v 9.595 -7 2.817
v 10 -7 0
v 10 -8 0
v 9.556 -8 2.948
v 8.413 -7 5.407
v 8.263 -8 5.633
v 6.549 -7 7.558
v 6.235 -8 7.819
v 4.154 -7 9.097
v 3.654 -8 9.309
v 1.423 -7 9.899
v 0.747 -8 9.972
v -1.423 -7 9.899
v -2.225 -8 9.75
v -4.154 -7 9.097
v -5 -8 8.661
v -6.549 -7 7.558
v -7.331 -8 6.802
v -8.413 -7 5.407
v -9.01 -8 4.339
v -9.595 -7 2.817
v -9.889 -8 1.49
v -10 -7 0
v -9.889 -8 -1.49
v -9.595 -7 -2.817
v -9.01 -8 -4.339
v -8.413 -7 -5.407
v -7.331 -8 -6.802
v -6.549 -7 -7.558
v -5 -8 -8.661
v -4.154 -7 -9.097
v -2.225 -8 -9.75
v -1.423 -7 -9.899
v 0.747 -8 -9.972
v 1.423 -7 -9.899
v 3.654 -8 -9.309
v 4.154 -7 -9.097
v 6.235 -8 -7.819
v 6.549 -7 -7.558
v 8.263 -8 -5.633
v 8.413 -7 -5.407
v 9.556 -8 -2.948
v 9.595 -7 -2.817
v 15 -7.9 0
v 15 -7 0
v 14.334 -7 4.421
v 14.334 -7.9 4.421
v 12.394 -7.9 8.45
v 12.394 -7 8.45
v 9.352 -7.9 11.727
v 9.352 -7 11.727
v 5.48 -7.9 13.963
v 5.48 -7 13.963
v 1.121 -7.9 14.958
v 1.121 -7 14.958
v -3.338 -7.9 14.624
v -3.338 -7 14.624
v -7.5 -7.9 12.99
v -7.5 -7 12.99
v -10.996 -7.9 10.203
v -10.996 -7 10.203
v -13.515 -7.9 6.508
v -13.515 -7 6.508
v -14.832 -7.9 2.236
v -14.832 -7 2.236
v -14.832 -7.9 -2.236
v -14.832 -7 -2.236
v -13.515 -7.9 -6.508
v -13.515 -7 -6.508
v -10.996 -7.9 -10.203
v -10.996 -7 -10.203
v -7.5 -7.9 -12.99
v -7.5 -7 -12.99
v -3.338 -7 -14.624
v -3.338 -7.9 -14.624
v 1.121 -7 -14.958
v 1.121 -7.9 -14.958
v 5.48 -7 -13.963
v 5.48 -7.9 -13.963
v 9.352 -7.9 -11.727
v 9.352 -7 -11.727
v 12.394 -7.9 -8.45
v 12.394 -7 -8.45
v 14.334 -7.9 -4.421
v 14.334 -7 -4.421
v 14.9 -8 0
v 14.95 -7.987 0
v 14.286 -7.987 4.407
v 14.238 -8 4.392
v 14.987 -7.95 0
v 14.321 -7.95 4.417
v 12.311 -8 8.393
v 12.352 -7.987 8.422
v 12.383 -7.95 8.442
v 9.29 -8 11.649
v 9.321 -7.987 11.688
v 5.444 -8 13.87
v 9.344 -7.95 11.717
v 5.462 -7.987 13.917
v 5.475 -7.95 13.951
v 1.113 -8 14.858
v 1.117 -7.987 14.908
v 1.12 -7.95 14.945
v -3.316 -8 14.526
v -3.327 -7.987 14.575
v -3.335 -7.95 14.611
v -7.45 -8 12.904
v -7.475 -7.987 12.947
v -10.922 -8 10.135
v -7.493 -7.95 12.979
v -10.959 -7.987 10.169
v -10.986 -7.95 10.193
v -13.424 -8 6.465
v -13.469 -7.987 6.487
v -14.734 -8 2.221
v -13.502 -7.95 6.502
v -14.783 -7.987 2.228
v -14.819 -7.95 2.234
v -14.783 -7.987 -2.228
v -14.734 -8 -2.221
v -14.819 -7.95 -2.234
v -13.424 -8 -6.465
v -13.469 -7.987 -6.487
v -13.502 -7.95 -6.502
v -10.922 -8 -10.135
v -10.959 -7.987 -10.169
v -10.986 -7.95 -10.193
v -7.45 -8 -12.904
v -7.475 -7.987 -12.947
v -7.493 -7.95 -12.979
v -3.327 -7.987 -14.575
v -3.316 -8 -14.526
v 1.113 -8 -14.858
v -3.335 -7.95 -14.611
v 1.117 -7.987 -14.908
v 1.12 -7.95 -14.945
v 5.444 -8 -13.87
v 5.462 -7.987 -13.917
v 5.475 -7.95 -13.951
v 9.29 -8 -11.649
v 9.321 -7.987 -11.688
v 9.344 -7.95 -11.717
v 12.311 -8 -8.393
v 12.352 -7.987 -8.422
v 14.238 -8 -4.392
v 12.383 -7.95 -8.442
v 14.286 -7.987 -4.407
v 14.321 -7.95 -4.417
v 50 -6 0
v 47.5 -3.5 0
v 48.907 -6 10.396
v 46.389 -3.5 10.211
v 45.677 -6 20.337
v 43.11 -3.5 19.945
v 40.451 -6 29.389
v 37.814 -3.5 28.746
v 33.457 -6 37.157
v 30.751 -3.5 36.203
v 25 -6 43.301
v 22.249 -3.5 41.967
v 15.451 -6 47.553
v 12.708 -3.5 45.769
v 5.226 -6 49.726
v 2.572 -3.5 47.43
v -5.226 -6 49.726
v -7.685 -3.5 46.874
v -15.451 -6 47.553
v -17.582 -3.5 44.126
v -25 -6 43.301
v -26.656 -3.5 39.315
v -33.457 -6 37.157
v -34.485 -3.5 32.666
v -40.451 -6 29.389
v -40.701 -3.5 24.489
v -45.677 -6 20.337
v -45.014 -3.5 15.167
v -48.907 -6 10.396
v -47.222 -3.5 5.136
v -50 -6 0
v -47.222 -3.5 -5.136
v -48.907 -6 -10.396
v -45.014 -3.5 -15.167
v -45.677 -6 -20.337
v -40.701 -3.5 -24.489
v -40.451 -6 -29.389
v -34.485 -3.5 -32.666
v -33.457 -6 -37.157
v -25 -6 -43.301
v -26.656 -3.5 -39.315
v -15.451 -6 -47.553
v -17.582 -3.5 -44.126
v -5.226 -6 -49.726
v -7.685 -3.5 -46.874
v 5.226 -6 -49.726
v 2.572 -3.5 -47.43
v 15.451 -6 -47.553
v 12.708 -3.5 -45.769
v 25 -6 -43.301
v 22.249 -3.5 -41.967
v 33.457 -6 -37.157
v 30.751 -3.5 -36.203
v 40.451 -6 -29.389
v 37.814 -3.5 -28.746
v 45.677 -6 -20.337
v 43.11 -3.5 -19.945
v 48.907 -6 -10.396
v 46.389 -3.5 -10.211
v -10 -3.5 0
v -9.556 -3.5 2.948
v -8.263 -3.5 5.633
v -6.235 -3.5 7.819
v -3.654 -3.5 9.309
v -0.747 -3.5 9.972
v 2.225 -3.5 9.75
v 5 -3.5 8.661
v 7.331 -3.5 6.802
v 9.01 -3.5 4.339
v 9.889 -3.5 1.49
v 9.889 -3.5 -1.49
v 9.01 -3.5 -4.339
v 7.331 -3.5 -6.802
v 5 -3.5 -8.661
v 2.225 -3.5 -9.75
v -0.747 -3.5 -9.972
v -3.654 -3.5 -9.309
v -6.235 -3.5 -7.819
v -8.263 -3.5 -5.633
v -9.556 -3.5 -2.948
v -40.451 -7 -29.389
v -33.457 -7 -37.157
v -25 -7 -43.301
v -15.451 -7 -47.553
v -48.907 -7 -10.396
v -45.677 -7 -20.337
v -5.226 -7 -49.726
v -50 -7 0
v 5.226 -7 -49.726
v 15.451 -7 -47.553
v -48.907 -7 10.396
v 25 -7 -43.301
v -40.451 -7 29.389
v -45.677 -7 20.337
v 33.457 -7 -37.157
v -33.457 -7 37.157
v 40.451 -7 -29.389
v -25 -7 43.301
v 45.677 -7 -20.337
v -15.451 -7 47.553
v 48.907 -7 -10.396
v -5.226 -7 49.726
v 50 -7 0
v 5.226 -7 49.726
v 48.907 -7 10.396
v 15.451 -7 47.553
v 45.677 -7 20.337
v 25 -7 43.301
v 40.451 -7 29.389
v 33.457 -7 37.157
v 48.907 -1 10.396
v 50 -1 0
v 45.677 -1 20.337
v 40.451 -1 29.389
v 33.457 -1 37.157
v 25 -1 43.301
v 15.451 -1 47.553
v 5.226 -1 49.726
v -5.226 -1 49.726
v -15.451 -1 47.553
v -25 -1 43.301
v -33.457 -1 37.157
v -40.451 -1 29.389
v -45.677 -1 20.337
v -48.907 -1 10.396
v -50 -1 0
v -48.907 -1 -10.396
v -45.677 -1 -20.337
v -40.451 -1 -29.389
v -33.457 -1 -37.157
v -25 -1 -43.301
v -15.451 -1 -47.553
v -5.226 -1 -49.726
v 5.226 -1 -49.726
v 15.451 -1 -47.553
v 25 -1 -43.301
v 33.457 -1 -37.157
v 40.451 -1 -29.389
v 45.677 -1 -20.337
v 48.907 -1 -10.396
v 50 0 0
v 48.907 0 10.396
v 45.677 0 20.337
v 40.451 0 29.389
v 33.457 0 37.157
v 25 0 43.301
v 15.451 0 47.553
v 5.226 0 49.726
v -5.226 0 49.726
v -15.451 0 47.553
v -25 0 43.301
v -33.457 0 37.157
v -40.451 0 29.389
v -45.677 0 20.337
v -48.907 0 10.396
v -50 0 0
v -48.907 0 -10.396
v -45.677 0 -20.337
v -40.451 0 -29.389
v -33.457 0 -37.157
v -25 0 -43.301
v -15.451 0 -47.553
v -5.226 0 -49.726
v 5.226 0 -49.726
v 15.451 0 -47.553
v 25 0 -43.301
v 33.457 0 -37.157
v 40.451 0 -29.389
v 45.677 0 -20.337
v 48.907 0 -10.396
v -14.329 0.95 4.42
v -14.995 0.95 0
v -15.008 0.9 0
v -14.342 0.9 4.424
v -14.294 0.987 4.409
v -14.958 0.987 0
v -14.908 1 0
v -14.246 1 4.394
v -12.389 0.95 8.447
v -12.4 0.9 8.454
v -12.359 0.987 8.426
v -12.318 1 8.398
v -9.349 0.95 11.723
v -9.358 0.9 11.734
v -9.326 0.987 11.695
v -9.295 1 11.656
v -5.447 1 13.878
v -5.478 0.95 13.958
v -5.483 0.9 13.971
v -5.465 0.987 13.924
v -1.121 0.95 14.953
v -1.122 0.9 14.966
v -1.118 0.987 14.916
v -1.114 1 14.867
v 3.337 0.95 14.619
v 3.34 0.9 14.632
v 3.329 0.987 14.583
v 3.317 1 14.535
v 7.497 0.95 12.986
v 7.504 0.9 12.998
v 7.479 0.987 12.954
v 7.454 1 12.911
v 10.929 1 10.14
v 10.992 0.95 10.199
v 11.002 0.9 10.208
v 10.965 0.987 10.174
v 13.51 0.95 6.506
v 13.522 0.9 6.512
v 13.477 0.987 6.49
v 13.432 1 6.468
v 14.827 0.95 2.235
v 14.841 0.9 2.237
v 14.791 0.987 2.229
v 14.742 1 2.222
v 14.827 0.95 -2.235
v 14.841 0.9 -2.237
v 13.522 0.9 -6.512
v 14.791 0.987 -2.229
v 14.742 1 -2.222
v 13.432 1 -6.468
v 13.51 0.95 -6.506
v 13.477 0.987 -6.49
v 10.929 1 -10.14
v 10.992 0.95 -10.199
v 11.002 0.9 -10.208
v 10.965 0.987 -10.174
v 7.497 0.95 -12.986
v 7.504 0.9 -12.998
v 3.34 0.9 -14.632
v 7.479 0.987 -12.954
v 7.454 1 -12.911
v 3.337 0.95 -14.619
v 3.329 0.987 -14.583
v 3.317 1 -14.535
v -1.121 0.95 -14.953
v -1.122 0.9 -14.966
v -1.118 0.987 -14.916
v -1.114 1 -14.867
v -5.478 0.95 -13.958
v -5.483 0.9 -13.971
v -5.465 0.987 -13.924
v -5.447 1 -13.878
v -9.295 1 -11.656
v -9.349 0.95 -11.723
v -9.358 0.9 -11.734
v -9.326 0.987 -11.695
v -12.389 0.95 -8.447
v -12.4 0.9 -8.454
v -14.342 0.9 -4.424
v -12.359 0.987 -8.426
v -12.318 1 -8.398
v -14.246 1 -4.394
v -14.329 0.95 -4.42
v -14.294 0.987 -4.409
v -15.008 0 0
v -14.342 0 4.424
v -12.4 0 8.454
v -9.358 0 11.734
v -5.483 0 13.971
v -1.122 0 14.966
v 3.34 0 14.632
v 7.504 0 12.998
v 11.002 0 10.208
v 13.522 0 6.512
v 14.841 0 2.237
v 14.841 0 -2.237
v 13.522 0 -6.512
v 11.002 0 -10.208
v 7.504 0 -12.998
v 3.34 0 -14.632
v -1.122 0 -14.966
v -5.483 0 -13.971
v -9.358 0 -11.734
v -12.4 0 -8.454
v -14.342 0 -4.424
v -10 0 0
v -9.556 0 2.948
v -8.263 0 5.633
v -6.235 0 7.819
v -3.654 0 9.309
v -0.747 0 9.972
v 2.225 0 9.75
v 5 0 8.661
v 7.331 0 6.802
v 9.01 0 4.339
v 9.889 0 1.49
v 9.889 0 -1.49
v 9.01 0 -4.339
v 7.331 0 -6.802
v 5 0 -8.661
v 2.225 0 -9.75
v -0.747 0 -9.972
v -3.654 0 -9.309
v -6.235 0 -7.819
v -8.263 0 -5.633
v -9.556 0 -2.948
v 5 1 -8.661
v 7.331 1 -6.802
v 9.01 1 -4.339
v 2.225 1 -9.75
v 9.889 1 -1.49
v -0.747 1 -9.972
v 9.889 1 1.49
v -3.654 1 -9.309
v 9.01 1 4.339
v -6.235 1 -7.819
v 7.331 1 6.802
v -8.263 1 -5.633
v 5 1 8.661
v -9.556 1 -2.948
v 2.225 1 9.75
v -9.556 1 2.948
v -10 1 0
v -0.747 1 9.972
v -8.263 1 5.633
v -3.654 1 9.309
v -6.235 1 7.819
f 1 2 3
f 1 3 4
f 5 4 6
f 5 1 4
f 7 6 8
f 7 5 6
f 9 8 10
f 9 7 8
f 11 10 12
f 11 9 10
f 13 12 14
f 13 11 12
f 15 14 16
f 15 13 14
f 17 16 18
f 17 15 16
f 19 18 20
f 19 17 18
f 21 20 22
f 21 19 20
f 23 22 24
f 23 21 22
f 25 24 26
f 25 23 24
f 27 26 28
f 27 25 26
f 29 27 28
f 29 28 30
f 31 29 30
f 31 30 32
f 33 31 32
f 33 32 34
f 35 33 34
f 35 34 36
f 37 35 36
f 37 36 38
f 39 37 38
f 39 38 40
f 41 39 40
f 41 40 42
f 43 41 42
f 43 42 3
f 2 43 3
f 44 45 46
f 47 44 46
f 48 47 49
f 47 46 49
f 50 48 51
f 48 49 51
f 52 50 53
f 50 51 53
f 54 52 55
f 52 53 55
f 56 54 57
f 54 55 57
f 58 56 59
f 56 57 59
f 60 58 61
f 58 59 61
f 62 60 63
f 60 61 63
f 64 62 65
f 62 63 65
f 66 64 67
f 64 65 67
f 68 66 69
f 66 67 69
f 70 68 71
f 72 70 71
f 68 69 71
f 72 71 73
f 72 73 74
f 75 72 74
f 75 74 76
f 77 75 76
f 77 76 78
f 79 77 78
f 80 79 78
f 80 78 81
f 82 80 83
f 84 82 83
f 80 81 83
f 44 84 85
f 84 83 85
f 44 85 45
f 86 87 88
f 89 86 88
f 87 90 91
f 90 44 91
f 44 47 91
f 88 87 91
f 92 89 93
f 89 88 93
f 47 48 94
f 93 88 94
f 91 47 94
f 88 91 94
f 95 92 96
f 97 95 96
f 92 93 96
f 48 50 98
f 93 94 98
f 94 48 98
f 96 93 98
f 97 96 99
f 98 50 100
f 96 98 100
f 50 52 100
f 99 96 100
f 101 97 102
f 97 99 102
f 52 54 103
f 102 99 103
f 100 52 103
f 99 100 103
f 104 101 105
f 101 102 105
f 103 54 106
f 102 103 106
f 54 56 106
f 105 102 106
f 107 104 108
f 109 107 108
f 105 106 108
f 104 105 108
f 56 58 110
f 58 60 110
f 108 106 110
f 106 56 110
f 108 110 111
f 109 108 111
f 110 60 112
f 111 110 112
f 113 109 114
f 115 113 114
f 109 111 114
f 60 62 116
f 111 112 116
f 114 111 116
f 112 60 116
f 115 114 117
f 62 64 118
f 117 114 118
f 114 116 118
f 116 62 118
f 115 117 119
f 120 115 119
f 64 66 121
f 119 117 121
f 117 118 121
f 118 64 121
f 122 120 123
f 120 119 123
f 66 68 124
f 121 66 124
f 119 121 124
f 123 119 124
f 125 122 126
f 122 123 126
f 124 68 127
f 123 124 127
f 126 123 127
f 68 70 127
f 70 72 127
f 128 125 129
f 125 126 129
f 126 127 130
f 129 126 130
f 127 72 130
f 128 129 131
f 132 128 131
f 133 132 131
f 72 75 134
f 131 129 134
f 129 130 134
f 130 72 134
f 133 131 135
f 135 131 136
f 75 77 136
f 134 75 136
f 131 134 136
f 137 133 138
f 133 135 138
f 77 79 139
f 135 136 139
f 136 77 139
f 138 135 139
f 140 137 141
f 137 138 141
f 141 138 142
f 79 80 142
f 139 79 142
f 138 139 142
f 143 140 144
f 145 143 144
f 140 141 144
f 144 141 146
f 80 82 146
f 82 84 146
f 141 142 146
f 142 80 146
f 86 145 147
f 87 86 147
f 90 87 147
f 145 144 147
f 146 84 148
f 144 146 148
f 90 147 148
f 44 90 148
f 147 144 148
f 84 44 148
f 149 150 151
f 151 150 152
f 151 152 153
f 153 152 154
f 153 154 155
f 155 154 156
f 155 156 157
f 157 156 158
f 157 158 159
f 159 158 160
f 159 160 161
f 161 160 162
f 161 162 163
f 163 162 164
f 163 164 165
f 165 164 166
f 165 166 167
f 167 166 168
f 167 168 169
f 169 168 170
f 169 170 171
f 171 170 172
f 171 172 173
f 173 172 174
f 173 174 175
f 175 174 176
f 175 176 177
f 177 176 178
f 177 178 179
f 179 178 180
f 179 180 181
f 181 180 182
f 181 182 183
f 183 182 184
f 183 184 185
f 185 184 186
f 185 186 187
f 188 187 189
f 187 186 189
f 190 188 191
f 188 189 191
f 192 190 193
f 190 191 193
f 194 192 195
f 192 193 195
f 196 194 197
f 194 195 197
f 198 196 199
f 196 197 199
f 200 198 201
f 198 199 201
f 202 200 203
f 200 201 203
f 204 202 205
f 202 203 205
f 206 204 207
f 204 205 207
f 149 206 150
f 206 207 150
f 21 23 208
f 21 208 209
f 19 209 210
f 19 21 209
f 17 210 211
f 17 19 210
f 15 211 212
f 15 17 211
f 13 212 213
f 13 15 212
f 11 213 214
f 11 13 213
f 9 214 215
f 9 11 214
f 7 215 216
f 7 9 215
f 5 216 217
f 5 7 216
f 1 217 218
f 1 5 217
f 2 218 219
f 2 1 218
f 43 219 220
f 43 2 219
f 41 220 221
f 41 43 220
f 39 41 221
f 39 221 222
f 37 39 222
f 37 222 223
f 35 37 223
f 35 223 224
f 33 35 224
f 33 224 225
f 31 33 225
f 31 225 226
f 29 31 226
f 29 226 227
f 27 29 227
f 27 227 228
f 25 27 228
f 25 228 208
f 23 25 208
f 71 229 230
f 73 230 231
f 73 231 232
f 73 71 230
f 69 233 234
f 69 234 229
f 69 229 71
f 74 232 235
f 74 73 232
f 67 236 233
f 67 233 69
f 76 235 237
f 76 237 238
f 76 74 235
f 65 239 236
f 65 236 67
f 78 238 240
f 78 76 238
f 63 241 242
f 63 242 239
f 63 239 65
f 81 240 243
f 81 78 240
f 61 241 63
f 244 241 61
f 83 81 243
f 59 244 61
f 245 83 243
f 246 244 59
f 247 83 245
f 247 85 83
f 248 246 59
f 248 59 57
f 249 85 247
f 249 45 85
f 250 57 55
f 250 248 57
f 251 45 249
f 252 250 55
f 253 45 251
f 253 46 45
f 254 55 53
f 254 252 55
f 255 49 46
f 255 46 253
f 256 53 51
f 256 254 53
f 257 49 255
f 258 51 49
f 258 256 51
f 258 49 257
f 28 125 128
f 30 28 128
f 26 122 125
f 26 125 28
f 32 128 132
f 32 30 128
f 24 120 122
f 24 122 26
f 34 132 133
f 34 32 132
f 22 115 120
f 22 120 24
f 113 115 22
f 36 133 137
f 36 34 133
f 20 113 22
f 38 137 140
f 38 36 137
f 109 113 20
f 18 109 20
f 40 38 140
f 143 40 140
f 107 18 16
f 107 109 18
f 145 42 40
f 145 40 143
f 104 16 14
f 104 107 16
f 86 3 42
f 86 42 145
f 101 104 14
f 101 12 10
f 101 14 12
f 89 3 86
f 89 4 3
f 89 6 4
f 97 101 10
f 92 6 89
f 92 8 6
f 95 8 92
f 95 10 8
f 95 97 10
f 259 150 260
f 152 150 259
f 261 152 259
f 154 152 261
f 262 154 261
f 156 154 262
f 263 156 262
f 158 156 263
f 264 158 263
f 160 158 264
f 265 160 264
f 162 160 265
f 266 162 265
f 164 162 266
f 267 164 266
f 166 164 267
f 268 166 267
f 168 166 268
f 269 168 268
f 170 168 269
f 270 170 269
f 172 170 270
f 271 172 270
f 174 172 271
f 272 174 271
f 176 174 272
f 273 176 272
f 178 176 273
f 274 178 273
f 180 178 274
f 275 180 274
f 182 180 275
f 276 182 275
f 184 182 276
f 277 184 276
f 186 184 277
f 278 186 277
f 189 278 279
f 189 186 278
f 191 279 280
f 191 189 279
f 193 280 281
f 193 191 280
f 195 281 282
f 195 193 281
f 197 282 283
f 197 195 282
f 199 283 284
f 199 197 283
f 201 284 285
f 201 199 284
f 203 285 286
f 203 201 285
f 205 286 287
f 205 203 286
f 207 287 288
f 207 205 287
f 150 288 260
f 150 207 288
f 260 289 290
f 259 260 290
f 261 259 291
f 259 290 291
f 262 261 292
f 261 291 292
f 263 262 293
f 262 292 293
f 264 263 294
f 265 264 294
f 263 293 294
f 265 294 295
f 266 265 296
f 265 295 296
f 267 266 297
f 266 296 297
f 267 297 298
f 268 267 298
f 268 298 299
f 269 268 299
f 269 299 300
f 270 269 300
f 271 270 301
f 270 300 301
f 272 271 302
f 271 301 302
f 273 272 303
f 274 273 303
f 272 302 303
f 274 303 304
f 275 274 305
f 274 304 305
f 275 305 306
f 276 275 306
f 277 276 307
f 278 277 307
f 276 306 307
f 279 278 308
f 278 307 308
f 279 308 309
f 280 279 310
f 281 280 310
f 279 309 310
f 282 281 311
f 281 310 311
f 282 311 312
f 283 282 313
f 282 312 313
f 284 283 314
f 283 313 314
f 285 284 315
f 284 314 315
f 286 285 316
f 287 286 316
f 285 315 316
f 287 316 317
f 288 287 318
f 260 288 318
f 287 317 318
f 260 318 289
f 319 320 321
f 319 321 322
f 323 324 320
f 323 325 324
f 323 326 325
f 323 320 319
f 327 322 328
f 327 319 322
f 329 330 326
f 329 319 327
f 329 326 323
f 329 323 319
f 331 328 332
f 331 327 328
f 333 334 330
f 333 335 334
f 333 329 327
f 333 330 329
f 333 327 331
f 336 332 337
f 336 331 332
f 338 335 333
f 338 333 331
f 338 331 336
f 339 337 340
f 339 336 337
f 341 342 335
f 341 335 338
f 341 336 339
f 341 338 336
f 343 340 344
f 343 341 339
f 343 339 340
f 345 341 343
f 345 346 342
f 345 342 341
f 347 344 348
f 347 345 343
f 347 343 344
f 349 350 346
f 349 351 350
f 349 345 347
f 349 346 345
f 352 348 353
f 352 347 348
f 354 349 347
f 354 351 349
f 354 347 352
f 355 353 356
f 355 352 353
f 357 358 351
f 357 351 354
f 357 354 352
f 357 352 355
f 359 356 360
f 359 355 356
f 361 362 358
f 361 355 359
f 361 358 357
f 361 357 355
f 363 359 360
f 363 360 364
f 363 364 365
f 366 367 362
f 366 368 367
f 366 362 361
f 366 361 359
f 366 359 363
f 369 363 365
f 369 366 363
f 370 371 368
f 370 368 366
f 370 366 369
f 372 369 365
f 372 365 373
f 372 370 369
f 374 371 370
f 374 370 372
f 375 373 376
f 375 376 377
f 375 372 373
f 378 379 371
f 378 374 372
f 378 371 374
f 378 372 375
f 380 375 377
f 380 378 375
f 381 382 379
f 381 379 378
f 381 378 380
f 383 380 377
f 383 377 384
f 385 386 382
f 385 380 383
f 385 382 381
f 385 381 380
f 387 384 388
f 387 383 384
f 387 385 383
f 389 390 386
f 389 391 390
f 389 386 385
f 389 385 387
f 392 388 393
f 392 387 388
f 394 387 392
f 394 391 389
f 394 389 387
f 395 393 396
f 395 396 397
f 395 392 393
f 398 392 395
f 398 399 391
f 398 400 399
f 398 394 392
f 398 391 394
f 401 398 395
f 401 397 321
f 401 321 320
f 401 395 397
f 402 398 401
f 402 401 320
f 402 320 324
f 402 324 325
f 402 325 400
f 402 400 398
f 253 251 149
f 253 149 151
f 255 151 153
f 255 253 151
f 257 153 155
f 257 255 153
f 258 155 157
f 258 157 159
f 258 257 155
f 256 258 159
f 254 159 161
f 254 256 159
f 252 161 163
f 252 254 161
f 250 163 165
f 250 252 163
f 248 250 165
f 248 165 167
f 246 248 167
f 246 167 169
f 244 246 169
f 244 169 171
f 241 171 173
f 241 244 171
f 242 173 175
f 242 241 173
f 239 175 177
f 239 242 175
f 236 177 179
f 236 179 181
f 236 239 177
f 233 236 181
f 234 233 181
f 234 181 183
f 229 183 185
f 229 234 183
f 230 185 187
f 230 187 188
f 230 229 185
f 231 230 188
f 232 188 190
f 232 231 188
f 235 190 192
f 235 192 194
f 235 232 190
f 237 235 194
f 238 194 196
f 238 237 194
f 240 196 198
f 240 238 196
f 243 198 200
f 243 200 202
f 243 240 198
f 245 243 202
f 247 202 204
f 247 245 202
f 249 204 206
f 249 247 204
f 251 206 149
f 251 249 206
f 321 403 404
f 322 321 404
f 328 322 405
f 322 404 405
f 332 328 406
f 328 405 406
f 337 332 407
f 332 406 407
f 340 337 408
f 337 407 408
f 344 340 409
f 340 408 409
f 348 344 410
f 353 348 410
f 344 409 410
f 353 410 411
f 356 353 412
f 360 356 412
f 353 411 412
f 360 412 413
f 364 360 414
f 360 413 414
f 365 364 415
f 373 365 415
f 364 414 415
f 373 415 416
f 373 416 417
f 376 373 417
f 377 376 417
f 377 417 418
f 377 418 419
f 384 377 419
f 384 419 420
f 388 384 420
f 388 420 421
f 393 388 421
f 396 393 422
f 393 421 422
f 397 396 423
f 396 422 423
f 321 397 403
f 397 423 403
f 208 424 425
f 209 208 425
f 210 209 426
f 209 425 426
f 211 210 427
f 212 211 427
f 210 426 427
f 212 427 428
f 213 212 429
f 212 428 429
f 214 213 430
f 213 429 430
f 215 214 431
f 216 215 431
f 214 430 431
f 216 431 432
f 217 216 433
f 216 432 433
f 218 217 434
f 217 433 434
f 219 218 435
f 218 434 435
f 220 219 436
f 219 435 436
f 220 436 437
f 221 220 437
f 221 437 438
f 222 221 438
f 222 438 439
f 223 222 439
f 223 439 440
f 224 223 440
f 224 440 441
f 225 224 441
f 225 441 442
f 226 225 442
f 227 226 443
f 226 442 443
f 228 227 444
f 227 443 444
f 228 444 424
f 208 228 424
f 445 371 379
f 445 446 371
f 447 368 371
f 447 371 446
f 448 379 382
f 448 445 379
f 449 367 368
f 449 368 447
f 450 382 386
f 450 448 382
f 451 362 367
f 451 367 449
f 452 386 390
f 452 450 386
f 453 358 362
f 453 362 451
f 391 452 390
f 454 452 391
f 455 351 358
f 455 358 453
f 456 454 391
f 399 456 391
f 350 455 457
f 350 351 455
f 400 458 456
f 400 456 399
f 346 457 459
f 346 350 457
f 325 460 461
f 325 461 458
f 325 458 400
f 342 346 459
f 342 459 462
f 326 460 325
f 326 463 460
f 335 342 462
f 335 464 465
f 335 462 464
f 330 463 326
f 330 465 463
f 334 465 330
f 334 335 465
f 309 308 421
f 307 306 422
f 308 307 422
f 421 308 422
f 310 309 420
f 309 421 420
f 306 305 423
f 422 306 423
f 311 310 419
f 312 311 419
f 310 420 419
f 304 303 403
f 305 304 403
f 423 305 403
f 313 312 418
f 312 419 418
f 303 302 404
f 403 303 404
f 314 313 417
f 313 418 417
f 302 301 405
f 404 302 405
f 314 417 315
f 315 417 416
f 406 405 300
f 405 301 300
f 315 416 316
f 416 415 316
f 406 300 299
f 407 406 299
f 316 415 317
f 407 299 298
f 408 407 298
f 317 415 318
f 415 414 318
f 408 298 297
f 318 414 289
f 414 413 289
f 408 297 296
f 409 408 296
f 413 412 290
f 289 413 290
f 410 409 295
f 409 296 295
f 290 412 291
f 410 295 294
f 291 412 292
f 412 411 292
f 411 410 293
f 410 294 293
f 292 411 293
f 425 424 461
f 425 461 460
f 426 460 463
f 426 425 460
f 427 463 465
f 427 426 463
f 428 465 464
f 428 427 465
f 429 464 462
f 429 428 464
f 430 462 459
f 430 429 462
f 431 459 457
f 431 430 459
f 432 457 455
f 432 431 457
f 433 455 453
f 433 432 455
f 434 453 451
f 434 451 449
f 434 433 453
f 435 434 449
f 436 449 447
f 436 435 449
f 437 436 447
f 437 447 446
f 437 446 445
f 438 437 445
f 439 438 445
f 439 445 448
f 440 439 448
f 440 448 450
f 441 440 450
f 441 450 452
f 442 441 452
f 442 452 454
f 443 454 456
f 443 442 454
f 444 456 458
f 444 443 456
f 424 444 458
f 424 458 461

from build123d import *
from build123d import SkipClean  # not in build123d's __all__

# Parameters (mm, degrees)
F0_R     = 50
F1_DEPTH = 3.5
F2_SIZE  = 2.5
F3_R     = 10.0003114876
F4_DEPTH = 3.5
F6_R     = 15
F6_R_2   = 10.0003114876
F7_DEPTH = 1
F8_R     = 15.0083101608
F8_R_2   = 10.0003114876
F9_DEPTH = 1
F10_R    = 0.1


with BuildPart() as f1:
    # F0 (on Front) → F1 (new body)
    with BuildSketch(Plane.XZ):
        Circle(F0_R)
    extrude(amount=F1_DEPTH)

    # F2
    f2_edges = [f1.edges().sort_by_distance(p)[0] for p in [
        (-50, -3.5, 0),
    ]]
    chamfer(f2_edges, length=F2_SIZE)

    # F3 (on face) → F4 (cut)
    with BuildSketch(Plane(origin=(0, 0, 0), x_dir=(-1, 0, 0), z_dir=(0, 1, 0))):
        Circle(F3_R)
    extrude(amount=-F4_DEPTH, mode=Mode.SUBTRACT)

    # F5: F1 across face


with BuildPart() as f1_1:
    add(f1.part, clean=False)
    add(f1.part.mirror(Plane.XZ.offset(3.5)), clean=False)

    # F6 (on face) → F7 (join)
    with BuildSketch(Plane.XZ.offset(7)):
        Circle(F6_R)
        Circle(F6_R_2, mode=Mode.SUBTRACT)
    with SkipClean():  # cleaning this boolean's faces spoils the solid; the shape is the same uncleaned
        extrude(amount=F7_DEPTH)

    # F8 (on face) → F9 (join)
    with BuildSketch(Plane(origin=(0, 0, 0), x_dir=(-1, 0, 0), z_dir=(0, 1, 0))):
        Circle(F8_R)
        Circle(F8_R_2, mode=Mode.SUBTRACT)
    extrude(amount=F9_DEPTH)

    # F10
    f10_edges = [f1_1.edges().sort_by_distance(p)[0] for p in [
        (-15, -8, 0),
        (15.00831, 1, 0),
    ]]
    fillet(f10_edges, radius=F10_R)


solid = f1_1.part
